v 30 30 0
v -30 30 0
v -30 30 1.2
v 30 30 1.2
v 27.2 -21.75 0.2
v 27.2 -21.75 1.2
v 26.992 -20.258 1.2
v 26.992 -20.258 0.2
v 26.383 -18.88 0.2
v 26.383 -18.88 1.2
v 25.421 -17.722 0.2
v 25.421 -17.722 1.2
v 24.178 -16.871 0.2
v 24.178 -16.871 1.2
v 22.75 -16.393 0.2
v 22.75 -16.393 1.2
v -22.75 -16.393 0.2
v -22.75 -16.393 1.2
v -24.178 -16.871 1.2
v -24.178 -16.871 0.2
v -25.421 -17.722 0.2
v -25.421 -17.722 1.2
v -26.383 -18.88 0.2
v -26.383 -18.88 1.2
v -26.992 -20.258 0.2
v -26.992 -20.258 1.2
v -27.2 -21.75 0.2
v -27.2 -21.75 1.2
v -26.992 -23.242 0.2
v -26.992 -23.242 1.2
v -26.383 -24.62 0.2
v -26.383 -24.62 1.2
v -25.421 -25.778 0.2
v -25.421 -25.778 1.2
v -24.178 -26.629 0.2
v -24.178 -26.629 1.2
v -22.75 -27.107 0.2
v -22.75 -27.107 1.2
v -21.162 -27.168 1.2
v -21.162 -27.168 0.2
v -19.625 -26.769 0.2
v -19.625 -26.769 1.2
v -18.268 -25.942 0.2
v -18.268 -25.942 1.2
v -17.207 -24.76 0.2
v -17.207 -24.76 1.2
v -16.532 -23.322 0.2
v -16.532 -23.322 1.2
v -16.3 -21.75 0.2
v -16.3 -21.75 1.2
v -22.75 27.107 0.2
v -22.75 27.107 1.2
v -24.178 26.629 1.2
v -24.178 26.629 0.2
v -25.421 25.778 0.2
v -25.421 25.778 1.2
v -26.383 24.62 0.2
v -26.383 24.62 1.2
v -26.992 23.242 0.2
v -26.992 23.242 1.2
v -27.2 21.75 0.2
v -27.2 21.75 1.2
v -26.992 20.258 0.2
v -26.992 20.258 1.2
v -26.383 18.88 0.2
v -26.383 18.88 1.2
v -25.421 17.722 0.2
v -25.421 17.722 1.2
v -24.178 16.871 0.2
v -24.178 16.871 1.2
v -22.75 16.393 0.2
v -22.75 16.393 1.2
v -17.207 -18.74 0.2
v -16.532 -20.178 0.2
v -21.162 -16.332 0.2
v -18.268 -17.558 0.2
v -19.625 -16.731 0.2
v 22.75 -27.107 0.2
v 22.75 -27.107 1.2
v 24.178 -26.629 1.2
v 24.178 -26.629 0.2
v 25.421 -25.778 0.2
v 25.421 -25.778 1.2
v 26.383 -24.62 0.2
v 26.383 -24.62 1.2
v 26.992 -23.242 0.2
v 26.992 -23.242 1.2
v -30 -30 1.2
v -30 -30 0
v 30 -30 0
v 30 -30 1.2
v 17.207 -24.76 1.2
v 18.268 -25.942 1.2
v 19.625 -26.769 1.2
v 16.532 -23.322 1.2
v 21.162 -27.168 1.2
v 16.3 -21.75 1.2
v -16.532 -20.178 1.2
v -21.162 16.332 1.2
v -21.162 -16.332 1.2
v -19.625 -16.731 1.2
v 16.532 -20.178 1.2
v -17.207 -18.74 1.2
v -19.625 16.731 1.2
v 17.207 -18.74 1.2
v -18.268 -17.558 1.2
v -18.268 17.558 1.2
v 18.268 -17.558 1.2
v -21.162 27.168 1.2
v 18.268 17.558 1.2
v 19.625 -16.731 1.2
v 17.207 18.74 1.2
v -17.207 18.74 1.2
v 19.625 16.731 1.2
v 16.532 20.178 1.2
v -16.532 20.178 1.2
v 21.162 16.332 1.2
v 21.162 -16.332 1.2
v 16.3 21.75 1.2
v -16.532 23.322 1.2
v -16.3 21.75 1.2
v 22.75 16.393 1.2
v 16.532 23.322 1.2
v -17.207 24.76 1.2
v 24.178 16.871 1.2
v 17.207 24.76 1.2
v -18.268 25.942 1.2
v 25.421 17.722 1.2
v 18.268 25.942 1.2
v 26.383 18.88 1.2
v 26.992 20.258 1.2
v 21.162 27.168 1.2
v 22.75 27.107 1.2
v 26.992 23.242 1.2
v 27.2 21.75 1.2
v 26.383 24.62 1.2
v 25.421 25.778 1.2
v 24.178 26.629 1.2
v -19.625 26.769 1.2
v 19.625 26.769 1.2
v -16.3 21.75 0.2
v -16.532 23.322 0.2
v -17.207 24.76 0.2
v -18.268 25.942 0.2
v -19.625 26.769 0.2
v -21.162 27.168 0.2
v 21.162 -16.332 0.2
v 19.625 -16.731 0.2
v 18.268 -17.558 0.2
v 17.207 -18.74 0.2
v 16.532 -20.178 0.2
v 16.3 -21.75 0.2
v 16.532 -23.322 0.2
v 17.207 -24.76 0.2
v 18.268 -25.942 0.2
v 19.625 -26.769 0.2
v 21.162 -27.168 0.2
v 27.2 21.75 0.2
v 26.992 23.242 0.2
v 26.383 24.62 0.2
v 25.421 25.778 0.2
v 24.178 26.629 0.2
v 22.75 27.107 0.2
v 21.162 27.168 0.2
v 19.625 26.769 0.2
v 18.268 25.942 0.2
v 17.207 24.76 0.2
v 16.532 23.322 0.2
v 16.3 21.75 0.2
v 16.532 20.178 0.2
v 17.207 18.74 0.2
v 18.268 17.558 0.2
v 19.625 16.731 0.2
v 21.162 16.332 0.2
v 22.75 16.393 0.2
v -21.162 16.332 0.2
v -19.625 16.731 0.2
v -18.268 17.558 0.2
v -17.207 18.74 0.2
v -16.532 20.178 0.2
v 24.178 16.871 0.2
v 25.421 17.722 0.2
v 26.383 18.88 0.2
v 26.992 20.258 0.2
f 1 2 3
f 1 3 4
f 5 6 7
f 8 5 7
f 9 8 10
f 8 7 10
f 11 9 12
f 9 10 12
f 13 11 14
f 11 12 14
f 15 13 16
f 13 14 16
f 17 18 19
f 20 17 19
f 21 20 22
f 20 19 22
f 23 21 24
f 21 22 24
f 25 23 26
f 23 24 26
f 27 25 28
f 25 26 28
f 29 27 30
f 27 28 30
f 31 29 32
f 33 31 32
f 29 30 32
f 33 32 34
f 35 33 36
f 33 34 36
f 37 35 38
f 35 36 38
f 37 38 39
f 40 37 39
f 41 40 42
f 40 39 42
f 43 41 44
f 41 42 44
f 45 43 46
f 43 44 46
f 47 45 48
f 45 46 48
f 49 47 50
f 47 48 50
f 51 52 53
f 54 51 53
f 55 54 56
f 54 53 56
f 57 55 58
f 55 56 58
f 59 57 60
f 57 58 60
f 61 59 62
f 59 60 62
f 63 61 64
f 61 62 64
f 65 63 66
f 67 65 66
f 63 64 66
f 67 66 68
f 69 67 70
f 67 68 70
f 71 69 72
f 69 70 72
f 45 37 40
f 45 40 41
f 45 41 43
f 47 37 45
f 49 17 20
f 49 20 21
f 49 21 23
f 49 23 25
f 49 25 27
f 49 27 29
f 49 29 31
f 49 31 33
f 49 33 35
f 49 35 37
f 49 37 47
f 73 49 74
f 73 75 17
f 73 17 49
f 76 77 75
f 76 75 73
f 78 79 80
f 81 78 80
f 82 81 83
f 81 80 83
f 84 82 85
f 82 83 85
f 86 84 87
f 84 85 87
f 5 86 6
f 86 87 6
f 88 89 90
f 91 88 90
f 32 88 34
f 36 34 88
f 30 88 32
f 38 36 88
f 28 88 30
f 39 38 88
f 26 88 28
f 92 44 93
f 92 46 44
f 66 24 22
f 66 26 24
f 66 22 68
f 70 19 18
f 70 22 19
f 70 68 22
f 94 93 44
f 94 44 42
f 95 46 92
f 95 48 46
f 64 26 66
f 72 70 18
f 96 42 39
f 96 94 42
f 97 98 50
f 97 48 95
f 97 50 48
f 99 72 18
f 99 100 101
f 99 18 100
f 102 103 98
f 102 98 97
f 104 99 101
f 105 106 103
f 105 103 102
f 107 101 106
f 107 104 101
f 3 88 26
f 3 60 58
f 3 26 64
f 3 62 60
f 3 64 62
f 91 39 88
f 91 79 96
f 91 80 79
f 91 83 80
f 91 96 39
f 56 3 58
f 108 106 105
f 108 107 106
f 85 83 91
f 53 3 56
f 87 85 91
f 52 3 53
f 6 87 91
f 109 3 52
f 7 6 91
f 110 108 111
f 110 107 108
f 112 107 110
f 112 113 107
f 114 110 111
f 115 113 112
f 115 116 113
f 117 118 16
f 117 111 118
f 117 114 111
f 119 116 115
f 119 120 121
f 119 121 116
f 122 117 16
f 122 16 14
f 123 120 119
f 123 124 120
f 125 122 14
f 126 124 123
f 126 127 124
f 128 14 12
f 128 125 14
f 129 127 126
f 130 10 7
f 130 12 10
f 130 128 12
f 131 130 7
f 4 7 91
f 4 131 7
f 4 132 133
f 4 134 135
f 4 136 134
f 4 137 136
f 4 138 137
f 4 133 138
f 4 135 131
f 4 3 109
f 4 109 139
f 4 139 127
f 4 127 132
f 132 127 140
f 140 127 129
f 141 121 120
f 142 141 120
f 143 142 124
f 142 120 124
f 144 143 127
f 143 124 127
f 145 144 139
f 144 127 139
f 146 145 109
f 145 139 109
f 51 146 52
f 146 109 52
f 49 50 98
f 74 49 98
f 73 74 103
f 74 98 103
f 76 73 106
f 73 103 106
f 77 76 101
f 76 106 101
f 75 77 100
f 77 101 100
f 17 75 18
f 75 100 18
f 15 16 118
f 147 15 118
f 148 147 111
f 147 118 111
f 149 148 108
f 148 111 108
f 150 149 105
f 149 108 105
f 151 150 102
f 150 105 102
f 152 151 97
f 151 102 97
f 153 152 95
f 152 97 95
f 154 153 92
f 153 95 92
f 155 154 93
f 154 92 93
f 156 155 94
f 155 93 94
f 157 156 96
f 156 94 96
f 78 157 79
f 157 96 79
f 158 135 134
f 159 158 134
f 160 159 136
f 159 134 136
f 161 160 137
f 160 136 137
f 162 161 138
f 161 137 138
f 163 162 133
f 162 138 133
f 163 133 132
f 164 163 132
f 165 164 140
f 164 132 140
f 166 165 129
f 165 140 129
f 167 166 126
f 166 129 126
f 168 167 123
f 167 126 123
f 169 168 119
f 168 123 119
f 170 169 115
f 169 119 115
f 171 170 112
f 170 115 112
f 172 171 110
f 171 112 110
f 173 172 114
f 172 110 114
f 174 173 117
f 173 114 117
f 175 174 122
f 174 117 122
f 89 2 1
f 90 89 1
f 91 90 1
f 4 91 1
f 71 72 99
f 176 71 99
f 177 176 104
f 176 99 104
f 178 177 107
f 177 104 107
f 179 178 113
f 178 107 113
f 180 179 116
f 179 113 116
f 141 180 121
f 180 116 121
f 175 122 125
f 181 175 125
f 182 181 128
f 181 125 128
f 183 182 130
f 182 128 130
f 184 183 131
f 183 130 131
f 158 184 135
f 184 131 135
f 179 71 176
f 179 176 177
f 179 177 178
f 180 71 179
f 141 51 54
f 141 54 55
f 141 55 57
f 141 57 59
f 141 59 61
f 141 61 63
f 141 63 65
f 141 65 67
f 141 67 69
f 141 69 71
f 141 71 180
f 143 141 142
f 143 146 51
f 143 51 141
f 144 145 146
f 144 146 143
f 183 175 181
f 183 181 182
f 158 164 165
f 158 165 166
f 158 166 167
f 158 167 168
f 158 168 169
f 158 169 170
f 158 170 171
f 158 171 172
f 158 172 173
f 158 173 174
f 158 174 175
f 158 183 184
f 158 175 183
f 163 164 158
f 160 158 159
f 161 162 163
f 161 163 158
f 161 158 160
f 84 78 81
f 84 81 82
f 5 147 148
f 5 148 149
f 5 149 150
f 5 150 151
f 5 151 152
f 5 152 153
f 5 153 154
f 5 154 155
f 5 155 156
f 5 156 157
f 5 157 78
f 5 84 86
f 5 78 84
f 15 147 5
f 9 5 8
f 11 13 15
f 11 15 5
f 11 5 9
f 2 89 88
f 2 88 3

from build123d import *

# Parameters (mm, degrees)
F0_W     = 60
F0_H     = 60
F1_DEPTH = 1.2
F3_DEPTH = 1


with BuildPart() as f1:
    # F0 (on Top) → F1 (new body)
    with BuildSketch(Plane.XY):
        Rectangle(F0_W, F0_H)
    extrude(amount=F1_DEPTH)

    # F2 (on face) → F3 (cut)
    with BuildSketch(Plane.XY.offset(1.2)):
        with BuildLine():
            Line((-22.75, 16.3925285815), (-22.75, 27.1074714185))
            ThreePointArc((-22.75, 27.1074714185), (-27.2, 21.75), (-22.75, 16.3925285815))
        make_face()
        with BuildLine():
            ThreePointArc((-16.3, 21.75), (-18.2677234458, 25.9424038451), (-22.75, 27.1074714185))
            Line((-22.75, 27.1074714185), (-22.75, 16.3925285815))
            ThreePointArc((-22.75, 16.3925285815), (-18.2677234458, 17.5575961549), (-16.3, 21.75))
        make_face()
        with BuildLine():
            Line((22.75, 16.3925285815), (22.75, 27.1074714185))
            ThreePointArc((22.75, 27.1074714185), (16.3, 21.75), (22.75, 16.3925285815))
        make_face()
        with BuildLine():
            ThreePointArc((22.75, 16.3925285815), (25.9424038451, 18.2677234458), (27.2, 21.75))
            ThreePointArc((27.2, 21.75), (25.9424038451, 25.2322765542), (22.75, 27.1074714185))
            Line((22.75, 27.1074714185), (22.75, 16.3925285815))
        make_face()
        with BuildLine():
            Line((22.75, -27.1074714185), (22.75, -16.3925285815))
            ThreePointArc((22.75, -16.3925285815), (16.3, -21.75), (22.75, -27.1074714185))
        make_face()
        with BuildLine():
            ThreePointArc((27.2, -21.75), (25.9424038451, -18.2677234458), (22.75, -16.3925285815))
            Line((22.75, -16.3925285815), (22.75, -27.1074714185))
            ThreePointArc((22.75, -27.1074714185), (25.9424038451, -25.2322765542), (27.2, -21.75))
        make_face()
        with BuildLine():
            ThreePointArc((-22.75, -16.3925285815), (-27.2, -21.75), (-22.75, -27.1074714185))
            Line((-22.75, -27.1074714185), (-22.75, -16.3925285815))
        make_face()
        with BuildLine():
            Line((-22.75, -16.3925285815), (-22.75, -27.1074714185))
            ThreePointArc((-22.75, -27.1074714185), (-18.2677234458, -25.9424038451), (-16.3, -21.75))
            ThreePointArc((-16.3, -21.75), (-18.2677234458, -17.5575961549), (-22.75, -16.3925285815))
        make_face()
    extrude(amount=-F3_DEPTH, mode=Mode.SUBTRACT)


solid = f1.part
